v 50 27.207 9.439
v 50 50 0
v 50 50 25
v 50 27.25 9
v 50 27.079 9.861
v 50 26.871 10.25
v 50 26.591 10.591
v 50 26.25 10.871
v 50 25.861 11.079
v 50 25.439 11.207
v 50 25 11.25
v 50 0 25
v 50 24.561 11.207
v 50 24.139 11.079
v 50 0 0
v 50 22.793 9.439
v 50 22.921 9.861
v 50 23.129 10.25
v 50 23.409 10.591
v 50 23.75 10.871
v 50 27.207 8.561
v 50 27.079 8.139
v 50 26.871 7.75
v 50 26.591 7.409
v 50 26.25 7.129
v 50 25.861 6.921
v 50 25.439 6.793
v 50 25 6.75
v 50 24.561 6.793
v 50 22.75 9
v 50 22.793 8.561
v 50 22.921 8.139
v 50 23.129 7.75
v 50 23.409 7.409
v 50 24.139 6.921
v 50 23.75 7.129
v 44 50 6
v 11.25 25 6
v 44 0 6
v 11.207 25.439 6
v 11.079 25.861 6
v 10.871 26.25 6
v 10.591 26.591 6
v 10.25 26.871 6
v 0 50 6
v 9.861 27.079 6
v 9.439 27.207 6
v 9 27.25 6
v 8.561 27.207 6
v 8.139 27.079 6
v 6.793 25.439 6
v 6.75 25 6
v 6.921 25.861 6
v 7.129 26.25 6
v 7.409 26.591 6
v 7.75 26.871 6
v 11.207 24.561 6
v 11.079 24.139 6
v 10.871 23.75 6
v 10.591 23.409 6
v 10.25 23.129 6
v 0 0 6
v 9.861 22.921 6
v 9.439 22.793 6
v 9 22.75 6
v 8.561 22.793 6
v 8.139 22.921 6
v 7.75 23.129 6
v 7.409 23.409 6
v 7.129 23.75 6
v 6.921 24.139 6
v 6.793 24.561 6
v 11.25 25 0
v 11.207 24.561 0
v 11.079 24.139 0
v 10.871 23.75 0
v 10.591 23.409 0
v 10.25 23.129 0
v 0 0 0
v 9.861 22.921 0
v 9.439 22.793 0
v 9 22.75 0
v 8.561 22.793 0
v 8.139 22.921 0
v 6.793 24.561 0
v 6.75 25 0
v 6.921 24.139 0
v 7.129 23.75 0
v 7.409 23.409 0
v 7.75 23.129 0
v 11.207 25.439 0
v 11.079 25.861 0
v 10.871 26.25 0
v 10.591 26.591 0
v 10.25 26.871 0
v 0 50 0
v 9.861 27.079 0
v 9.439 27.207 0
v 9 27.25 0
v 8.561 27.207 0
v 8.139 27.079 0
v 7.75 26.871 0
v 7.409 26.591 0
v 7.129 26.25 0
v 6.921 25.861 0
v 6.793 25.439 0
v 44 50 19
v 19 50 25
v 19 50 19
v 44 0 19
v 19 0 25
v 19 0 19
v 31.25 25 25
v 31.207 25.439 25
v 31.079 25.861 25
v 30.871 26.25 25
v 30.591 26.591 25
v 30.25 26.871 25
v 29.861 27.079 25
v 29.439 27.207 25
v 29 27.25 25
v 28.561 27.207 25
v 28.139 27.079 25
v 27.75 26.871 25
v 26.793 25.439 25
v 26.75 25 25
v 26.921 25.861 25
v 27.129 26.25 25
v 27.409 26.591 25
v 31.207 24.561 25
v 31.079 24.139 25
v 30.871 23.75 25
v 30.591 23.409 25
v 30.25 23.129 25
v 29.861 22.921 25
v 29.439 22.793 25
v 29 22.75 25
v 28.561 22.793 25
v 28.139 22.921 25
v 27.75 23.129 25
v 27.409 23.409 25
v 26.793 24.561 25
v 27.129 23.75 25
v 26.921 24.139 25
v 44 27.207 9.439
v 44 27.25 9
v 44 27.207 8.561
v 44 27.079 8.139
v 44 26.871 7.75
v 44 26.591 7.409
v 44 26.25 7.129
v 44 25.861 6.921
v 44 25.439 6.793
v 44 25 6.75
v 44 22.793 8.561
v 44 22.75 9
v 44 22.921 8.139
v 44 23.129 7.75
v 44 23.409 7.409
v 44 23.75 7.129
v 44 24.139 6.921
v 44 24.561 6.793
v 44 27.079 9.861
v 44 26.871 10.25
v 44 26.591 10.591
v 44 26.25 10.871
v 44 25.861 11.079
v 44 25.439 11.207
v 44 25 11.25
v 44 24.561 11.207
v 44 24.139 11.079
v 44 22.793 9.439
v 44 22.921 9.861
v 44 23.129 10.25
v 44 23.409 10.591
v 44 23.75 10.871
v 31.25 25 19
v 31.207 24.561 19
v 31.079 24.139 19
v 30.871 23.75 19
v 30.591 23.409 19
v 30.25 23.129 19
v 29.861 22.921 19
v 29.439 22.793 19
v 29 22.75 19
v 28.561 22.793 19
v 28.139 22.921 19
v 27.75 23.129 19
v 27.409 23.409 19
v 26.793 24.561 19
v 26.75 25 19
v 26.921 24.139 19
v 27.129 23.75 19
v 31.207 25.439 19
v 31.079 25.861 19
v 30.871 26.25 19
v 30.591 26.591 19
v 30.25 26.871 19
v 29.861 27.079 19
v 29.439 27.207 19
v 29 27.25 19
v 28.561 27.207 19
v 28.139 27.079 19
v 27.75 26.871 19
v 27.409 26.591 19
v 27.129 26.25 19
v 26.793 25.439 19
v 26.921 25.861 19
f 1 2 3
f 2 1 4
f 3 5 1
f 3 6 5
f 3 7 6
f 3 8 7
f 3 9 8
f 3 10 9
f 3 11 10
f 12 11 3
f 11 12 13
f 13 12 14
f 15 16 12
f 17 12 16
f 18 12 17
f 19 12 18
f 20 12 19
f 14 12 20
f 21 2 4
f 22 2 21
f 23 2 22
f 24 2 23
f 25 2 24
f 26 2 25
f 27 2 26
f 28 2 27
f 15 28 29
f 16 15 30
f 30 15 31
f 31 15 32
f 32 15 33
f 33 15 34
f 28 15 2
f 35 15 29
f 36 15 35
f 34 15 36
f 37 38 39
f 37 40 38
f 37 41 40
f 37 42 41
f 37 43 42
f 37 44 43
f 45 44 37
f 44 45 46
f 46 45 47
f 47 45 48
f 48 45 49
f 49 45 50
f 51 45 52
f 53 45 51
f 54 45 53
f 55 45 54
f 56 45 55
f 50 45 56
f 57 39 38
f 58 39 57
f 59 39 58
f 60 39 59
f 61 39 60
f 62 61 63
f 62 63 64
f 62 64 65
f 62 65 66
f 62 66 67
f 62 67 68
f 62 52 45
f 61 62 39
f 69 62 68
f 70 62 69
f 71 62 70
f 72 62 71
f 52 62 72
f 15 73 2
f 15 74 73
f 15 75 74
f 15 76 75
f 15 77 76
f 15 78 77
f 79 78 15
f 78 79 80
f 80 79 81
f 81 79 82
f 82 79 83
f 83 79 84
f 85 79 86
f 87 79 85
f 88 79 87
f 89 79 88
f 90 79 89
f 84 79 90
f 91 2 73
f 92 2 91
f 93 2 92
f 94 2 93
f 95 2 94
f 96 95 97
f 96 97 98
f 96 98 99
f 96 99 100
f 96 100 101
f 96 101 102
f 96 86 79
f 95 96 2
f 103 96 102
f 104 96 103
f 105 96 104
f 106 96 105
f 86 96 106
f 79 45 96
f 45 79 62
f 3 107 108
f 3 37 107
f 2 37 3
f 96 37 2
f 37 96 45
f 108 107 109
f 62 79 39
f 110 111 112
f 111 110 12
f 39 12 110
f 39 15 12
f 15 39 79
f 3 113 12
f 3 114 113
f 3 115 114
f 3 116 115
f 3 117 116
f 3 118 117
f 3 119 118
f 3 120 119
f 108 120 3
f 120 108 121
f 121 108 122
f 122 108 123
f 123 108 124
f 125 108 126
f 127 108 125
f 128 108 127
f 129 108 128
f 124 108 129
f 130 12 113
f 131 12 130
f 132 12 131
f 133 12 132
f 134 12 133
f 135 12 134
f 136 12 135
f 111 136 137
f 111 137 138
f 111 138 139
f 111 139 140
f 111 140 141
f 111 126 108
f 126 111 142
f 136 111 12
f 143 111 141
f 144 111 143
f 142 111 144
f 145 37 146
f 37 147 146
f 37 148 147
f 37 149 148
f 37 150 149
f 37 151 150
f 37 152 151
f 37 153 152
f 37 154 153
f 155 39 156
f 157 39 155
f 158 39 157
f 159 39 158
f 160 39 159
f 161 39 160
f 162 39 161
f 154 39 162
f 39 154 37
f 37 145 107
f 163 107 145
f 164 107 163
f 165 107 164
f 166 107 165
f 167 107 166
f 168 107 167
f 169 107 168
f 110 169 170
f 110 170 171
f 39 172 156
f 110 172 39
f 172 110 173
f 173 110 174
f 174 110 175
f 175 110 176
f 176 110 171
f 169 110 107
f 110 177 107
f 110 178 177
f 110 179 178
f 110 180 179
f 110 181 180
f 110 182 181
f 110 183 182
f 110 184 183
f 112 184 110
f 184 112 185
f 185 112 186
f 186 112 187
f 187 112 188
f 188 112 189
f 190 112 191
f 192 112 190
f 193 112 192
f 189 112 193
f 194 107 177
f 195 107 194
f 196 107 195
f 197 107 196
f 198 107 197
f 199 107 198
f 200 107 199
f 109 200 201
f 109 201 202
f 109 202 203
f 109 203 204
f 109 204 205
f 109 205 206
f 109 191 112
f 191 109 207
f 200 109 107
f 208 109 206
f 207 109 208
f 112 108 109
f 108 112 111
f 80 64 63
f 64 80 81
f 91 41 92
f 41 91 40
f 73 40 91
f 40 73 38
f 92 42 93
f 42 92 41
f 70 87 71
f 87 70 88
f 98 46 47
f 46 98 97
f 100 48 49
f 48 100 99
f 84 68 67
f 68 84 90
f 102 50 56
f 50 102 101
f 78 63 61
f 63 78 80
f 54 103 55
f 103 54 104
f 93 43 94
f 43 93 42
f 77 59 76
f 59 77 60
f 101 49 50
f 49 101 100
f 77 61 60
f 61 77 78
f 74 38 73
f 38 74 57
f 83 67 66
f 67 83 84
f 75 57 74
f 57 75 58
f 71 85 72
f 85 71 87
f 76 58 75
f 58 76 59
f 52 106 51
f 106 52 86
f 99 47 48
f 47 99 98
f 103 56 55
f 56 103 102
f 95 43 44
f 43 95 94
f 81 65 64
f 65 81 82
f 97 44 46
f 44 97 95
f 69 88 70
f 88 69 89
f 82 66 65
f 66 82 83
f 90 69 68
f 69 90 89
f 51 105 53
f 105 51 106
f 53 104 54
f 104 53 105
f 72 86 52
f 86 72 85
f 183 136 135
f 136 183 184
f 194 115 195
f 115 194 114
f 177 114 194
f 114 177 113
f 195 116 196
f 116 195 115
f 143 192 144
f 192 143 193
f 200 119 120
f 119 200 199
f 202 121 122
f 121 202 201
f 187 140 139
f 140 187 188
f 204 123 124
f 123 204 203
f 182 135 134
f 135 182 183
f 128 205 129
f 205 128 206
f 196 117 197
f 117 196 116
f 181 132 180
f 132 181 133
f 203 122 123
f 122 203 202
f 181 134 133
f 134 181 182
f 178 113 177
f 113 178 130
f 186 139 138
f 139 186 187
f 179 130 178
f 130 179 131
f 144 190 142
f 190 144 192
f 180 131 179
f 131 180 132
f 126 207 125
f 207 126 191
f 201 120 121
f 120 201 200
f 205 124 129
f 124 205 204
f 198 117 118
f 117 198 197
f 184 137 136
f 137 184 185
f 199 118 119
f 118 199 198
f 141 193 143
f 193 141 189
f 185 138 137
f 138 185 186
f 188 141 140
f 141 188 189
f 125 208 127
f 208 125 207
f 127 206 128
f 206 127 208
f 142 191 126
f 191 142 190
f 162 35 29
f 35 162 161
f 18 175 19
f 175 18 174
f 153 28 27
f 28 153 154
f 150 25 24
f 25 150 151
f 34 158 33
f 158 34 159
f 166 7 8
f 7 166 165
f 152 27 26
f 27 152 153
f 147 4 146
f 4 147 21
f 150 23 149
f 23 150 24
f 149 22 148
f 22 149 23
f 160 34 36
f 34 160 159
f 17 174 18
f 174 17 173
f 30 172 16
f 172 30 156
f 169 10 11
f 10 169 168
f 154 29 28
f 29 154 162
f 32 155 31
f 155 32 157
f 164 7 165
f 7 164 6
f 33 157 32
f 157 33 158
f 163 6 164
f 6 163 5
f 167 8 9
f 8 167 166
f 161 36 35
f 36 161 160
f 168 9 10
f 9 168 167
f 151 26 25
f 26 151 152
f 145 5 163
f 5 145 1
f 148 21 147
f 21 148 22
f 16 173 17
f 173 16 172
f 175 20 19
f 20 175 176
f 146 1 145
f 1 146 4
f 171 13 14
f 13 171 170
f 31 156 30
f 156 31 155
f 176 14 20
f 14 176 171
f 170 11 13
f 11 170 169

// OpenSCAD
$fn = 32;

// ----------------------------------------------------------------------
// Z-bracket: 50 x 50 x 25 mm
// ----------------------------------------------------------------------

// --- parameters (mm) ---
lower_len = 50;           // lower foot length, X
upper_len = 25;           // upper foot length, X
width = 50;               // bracket width, Y
rise = 25;                // overall rise, Z
thick = 6;                // plate thickness
hole_d = 4.5;             // clearance for M4

module hole_z(px, py, z0) {
  translate([px, py, z0 - 0.5]) cylinder(h = thick + 1, d = hole_d);
}
module hole_x(py, pz) {
  translate([-0.5, py, pz]) rotate([0, 90, 0]) cylinder(h = thick + 1, d = hole_d);
}

difference() {
  union() {
    cube([lower_len, width, thick]);
    /* web, overlapping the lower foot */
    translate([lower_len - thick, 0, 0]) cube([thick, width, rise]);
    /* upper foot, sunk into the web */
    translate([lower_len - thick - upper_len, 0, rise - thick]) cube([upper_len + thick, width, thick]);
  }
  hole_z(9, 25, 0);
  translate([lower_len - thick - 15, 0, 0]) hole_z(0, 25, rise - thick);
  translate([lower_len - thick, 0, 0]) hole_x(25, 9);
}
